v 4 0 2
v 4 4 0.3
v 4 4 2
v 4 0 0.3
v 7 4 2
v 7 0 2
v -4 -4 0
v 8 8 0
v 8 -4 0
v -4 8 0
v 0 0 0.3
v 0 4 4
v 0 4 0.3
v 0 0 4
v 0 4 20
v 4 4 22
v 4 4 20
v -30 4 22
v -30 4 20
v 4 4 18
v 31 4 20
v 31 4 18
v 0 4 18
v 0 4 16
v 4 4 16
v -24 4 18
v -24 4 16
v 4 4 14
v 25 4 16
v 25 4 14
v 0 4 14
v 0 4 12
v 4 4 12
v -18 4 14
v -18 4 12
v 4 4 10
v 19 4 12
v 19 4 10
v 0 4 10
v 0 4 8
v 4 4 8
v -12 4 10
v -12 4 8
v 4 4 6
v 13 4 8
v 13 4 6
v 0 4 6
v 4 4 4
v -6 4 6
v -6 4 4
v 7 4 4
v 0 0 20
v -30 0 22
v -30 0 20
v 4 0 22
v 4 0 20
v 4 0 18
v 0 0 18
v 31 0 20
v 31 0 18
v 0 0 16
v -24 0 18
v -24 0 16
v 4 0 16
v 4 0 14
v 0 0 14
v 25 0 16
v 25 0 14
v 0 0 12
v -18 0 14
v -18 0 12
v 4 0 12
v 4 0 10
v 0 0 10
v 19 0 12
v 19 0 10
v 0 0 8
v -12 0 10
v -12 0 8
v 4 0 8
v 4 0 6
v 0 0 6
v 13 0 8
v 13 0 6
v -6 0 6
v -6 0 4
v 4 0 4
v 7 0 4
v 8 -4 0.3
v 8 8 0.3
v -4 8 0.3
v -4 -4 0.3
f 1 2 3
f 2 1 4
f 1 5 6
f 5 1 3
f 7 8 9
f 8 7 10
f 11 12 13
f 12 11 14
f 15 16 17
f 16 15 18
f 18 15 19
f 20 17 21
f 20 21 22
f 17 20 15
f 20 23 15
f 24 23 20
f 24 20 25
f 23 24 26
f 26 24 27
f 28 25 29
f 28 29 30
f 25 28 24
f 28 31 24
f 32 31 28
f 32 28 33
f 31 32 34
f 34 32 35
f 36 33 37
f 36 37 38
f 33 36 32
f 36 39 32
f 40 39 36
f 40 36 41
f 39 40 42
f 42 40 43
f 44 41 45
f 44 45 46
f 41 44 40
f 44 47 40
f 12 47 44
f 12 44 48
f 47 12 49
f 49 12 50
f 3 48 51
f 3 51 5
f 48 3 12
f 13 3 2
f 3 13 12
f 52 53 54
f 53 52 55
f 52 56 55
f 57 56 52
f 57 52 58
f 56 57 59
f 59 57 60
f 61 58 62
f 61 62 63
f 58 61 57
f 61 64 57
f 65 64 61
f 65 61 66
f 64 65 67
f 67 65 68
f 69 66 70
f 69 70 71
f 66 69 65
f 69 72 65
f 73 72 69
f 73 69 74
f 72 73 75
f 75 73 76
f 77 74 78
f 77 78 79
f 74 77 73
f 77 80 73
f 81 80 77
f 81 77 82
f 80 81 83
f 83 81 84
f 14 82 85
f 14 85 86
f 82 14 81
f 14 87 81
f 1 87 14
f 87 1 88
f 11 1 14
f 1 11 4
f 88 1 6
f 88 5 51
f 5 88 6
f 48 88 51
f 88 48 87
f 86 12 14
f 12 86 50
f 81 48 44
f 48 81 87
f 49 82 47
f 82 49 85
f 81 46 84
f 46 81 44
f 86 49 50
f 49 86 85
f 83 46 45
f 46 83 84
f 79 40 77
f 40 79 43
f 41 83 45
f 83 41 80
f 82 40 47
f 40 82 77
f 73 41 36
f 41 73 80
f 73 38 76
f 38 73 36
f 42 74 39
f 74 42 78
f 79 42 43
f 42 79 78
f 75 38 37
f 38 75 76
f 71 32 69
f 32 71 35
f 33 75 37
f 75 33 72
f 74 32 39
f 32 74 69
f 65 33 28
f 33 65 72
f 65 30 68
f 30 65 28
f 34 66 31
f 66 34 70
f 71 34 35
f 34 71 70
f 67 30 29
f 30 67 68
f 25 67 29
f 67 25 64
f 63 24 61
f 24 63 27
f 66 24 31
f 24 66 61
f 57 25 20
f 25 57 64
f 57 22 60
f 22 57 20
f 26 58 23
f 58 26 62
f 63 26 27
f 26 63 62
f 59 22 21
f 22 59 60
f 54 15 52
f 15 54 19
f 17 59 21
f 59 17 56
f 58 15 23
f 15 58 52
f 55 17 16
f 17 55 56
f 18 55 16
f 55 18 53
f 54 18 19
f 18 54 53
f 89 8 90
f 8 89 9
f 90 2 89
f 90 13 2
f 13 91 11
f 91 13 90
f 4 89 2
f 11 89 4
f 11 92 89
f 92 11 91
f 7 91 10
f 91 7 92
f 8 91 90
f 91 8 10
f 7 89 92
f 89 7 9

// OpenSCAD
// Length of longest overhang
_maxOverhang = 30;

// Length difference between each overhanging bar
_increment = 3;

// height of each bar
_height = 2;

// size of the center column (also the width of each bar)
_size = 4;


module make() {
	maxLevel = floor(_maxOverhang/_increment);
	union() {
		for(level = [0:maxLevel]) {
			assign(length = level * _increment) {
				translate([level%2==0 ? -length : 0, 0, _height * level])
					cube([length+_size, _size, _height]);
			}
		}

		// base
		translate([-_size,-_size,0])
		cube([_size*3,_size*3,0.3]);
	}
}

make();
